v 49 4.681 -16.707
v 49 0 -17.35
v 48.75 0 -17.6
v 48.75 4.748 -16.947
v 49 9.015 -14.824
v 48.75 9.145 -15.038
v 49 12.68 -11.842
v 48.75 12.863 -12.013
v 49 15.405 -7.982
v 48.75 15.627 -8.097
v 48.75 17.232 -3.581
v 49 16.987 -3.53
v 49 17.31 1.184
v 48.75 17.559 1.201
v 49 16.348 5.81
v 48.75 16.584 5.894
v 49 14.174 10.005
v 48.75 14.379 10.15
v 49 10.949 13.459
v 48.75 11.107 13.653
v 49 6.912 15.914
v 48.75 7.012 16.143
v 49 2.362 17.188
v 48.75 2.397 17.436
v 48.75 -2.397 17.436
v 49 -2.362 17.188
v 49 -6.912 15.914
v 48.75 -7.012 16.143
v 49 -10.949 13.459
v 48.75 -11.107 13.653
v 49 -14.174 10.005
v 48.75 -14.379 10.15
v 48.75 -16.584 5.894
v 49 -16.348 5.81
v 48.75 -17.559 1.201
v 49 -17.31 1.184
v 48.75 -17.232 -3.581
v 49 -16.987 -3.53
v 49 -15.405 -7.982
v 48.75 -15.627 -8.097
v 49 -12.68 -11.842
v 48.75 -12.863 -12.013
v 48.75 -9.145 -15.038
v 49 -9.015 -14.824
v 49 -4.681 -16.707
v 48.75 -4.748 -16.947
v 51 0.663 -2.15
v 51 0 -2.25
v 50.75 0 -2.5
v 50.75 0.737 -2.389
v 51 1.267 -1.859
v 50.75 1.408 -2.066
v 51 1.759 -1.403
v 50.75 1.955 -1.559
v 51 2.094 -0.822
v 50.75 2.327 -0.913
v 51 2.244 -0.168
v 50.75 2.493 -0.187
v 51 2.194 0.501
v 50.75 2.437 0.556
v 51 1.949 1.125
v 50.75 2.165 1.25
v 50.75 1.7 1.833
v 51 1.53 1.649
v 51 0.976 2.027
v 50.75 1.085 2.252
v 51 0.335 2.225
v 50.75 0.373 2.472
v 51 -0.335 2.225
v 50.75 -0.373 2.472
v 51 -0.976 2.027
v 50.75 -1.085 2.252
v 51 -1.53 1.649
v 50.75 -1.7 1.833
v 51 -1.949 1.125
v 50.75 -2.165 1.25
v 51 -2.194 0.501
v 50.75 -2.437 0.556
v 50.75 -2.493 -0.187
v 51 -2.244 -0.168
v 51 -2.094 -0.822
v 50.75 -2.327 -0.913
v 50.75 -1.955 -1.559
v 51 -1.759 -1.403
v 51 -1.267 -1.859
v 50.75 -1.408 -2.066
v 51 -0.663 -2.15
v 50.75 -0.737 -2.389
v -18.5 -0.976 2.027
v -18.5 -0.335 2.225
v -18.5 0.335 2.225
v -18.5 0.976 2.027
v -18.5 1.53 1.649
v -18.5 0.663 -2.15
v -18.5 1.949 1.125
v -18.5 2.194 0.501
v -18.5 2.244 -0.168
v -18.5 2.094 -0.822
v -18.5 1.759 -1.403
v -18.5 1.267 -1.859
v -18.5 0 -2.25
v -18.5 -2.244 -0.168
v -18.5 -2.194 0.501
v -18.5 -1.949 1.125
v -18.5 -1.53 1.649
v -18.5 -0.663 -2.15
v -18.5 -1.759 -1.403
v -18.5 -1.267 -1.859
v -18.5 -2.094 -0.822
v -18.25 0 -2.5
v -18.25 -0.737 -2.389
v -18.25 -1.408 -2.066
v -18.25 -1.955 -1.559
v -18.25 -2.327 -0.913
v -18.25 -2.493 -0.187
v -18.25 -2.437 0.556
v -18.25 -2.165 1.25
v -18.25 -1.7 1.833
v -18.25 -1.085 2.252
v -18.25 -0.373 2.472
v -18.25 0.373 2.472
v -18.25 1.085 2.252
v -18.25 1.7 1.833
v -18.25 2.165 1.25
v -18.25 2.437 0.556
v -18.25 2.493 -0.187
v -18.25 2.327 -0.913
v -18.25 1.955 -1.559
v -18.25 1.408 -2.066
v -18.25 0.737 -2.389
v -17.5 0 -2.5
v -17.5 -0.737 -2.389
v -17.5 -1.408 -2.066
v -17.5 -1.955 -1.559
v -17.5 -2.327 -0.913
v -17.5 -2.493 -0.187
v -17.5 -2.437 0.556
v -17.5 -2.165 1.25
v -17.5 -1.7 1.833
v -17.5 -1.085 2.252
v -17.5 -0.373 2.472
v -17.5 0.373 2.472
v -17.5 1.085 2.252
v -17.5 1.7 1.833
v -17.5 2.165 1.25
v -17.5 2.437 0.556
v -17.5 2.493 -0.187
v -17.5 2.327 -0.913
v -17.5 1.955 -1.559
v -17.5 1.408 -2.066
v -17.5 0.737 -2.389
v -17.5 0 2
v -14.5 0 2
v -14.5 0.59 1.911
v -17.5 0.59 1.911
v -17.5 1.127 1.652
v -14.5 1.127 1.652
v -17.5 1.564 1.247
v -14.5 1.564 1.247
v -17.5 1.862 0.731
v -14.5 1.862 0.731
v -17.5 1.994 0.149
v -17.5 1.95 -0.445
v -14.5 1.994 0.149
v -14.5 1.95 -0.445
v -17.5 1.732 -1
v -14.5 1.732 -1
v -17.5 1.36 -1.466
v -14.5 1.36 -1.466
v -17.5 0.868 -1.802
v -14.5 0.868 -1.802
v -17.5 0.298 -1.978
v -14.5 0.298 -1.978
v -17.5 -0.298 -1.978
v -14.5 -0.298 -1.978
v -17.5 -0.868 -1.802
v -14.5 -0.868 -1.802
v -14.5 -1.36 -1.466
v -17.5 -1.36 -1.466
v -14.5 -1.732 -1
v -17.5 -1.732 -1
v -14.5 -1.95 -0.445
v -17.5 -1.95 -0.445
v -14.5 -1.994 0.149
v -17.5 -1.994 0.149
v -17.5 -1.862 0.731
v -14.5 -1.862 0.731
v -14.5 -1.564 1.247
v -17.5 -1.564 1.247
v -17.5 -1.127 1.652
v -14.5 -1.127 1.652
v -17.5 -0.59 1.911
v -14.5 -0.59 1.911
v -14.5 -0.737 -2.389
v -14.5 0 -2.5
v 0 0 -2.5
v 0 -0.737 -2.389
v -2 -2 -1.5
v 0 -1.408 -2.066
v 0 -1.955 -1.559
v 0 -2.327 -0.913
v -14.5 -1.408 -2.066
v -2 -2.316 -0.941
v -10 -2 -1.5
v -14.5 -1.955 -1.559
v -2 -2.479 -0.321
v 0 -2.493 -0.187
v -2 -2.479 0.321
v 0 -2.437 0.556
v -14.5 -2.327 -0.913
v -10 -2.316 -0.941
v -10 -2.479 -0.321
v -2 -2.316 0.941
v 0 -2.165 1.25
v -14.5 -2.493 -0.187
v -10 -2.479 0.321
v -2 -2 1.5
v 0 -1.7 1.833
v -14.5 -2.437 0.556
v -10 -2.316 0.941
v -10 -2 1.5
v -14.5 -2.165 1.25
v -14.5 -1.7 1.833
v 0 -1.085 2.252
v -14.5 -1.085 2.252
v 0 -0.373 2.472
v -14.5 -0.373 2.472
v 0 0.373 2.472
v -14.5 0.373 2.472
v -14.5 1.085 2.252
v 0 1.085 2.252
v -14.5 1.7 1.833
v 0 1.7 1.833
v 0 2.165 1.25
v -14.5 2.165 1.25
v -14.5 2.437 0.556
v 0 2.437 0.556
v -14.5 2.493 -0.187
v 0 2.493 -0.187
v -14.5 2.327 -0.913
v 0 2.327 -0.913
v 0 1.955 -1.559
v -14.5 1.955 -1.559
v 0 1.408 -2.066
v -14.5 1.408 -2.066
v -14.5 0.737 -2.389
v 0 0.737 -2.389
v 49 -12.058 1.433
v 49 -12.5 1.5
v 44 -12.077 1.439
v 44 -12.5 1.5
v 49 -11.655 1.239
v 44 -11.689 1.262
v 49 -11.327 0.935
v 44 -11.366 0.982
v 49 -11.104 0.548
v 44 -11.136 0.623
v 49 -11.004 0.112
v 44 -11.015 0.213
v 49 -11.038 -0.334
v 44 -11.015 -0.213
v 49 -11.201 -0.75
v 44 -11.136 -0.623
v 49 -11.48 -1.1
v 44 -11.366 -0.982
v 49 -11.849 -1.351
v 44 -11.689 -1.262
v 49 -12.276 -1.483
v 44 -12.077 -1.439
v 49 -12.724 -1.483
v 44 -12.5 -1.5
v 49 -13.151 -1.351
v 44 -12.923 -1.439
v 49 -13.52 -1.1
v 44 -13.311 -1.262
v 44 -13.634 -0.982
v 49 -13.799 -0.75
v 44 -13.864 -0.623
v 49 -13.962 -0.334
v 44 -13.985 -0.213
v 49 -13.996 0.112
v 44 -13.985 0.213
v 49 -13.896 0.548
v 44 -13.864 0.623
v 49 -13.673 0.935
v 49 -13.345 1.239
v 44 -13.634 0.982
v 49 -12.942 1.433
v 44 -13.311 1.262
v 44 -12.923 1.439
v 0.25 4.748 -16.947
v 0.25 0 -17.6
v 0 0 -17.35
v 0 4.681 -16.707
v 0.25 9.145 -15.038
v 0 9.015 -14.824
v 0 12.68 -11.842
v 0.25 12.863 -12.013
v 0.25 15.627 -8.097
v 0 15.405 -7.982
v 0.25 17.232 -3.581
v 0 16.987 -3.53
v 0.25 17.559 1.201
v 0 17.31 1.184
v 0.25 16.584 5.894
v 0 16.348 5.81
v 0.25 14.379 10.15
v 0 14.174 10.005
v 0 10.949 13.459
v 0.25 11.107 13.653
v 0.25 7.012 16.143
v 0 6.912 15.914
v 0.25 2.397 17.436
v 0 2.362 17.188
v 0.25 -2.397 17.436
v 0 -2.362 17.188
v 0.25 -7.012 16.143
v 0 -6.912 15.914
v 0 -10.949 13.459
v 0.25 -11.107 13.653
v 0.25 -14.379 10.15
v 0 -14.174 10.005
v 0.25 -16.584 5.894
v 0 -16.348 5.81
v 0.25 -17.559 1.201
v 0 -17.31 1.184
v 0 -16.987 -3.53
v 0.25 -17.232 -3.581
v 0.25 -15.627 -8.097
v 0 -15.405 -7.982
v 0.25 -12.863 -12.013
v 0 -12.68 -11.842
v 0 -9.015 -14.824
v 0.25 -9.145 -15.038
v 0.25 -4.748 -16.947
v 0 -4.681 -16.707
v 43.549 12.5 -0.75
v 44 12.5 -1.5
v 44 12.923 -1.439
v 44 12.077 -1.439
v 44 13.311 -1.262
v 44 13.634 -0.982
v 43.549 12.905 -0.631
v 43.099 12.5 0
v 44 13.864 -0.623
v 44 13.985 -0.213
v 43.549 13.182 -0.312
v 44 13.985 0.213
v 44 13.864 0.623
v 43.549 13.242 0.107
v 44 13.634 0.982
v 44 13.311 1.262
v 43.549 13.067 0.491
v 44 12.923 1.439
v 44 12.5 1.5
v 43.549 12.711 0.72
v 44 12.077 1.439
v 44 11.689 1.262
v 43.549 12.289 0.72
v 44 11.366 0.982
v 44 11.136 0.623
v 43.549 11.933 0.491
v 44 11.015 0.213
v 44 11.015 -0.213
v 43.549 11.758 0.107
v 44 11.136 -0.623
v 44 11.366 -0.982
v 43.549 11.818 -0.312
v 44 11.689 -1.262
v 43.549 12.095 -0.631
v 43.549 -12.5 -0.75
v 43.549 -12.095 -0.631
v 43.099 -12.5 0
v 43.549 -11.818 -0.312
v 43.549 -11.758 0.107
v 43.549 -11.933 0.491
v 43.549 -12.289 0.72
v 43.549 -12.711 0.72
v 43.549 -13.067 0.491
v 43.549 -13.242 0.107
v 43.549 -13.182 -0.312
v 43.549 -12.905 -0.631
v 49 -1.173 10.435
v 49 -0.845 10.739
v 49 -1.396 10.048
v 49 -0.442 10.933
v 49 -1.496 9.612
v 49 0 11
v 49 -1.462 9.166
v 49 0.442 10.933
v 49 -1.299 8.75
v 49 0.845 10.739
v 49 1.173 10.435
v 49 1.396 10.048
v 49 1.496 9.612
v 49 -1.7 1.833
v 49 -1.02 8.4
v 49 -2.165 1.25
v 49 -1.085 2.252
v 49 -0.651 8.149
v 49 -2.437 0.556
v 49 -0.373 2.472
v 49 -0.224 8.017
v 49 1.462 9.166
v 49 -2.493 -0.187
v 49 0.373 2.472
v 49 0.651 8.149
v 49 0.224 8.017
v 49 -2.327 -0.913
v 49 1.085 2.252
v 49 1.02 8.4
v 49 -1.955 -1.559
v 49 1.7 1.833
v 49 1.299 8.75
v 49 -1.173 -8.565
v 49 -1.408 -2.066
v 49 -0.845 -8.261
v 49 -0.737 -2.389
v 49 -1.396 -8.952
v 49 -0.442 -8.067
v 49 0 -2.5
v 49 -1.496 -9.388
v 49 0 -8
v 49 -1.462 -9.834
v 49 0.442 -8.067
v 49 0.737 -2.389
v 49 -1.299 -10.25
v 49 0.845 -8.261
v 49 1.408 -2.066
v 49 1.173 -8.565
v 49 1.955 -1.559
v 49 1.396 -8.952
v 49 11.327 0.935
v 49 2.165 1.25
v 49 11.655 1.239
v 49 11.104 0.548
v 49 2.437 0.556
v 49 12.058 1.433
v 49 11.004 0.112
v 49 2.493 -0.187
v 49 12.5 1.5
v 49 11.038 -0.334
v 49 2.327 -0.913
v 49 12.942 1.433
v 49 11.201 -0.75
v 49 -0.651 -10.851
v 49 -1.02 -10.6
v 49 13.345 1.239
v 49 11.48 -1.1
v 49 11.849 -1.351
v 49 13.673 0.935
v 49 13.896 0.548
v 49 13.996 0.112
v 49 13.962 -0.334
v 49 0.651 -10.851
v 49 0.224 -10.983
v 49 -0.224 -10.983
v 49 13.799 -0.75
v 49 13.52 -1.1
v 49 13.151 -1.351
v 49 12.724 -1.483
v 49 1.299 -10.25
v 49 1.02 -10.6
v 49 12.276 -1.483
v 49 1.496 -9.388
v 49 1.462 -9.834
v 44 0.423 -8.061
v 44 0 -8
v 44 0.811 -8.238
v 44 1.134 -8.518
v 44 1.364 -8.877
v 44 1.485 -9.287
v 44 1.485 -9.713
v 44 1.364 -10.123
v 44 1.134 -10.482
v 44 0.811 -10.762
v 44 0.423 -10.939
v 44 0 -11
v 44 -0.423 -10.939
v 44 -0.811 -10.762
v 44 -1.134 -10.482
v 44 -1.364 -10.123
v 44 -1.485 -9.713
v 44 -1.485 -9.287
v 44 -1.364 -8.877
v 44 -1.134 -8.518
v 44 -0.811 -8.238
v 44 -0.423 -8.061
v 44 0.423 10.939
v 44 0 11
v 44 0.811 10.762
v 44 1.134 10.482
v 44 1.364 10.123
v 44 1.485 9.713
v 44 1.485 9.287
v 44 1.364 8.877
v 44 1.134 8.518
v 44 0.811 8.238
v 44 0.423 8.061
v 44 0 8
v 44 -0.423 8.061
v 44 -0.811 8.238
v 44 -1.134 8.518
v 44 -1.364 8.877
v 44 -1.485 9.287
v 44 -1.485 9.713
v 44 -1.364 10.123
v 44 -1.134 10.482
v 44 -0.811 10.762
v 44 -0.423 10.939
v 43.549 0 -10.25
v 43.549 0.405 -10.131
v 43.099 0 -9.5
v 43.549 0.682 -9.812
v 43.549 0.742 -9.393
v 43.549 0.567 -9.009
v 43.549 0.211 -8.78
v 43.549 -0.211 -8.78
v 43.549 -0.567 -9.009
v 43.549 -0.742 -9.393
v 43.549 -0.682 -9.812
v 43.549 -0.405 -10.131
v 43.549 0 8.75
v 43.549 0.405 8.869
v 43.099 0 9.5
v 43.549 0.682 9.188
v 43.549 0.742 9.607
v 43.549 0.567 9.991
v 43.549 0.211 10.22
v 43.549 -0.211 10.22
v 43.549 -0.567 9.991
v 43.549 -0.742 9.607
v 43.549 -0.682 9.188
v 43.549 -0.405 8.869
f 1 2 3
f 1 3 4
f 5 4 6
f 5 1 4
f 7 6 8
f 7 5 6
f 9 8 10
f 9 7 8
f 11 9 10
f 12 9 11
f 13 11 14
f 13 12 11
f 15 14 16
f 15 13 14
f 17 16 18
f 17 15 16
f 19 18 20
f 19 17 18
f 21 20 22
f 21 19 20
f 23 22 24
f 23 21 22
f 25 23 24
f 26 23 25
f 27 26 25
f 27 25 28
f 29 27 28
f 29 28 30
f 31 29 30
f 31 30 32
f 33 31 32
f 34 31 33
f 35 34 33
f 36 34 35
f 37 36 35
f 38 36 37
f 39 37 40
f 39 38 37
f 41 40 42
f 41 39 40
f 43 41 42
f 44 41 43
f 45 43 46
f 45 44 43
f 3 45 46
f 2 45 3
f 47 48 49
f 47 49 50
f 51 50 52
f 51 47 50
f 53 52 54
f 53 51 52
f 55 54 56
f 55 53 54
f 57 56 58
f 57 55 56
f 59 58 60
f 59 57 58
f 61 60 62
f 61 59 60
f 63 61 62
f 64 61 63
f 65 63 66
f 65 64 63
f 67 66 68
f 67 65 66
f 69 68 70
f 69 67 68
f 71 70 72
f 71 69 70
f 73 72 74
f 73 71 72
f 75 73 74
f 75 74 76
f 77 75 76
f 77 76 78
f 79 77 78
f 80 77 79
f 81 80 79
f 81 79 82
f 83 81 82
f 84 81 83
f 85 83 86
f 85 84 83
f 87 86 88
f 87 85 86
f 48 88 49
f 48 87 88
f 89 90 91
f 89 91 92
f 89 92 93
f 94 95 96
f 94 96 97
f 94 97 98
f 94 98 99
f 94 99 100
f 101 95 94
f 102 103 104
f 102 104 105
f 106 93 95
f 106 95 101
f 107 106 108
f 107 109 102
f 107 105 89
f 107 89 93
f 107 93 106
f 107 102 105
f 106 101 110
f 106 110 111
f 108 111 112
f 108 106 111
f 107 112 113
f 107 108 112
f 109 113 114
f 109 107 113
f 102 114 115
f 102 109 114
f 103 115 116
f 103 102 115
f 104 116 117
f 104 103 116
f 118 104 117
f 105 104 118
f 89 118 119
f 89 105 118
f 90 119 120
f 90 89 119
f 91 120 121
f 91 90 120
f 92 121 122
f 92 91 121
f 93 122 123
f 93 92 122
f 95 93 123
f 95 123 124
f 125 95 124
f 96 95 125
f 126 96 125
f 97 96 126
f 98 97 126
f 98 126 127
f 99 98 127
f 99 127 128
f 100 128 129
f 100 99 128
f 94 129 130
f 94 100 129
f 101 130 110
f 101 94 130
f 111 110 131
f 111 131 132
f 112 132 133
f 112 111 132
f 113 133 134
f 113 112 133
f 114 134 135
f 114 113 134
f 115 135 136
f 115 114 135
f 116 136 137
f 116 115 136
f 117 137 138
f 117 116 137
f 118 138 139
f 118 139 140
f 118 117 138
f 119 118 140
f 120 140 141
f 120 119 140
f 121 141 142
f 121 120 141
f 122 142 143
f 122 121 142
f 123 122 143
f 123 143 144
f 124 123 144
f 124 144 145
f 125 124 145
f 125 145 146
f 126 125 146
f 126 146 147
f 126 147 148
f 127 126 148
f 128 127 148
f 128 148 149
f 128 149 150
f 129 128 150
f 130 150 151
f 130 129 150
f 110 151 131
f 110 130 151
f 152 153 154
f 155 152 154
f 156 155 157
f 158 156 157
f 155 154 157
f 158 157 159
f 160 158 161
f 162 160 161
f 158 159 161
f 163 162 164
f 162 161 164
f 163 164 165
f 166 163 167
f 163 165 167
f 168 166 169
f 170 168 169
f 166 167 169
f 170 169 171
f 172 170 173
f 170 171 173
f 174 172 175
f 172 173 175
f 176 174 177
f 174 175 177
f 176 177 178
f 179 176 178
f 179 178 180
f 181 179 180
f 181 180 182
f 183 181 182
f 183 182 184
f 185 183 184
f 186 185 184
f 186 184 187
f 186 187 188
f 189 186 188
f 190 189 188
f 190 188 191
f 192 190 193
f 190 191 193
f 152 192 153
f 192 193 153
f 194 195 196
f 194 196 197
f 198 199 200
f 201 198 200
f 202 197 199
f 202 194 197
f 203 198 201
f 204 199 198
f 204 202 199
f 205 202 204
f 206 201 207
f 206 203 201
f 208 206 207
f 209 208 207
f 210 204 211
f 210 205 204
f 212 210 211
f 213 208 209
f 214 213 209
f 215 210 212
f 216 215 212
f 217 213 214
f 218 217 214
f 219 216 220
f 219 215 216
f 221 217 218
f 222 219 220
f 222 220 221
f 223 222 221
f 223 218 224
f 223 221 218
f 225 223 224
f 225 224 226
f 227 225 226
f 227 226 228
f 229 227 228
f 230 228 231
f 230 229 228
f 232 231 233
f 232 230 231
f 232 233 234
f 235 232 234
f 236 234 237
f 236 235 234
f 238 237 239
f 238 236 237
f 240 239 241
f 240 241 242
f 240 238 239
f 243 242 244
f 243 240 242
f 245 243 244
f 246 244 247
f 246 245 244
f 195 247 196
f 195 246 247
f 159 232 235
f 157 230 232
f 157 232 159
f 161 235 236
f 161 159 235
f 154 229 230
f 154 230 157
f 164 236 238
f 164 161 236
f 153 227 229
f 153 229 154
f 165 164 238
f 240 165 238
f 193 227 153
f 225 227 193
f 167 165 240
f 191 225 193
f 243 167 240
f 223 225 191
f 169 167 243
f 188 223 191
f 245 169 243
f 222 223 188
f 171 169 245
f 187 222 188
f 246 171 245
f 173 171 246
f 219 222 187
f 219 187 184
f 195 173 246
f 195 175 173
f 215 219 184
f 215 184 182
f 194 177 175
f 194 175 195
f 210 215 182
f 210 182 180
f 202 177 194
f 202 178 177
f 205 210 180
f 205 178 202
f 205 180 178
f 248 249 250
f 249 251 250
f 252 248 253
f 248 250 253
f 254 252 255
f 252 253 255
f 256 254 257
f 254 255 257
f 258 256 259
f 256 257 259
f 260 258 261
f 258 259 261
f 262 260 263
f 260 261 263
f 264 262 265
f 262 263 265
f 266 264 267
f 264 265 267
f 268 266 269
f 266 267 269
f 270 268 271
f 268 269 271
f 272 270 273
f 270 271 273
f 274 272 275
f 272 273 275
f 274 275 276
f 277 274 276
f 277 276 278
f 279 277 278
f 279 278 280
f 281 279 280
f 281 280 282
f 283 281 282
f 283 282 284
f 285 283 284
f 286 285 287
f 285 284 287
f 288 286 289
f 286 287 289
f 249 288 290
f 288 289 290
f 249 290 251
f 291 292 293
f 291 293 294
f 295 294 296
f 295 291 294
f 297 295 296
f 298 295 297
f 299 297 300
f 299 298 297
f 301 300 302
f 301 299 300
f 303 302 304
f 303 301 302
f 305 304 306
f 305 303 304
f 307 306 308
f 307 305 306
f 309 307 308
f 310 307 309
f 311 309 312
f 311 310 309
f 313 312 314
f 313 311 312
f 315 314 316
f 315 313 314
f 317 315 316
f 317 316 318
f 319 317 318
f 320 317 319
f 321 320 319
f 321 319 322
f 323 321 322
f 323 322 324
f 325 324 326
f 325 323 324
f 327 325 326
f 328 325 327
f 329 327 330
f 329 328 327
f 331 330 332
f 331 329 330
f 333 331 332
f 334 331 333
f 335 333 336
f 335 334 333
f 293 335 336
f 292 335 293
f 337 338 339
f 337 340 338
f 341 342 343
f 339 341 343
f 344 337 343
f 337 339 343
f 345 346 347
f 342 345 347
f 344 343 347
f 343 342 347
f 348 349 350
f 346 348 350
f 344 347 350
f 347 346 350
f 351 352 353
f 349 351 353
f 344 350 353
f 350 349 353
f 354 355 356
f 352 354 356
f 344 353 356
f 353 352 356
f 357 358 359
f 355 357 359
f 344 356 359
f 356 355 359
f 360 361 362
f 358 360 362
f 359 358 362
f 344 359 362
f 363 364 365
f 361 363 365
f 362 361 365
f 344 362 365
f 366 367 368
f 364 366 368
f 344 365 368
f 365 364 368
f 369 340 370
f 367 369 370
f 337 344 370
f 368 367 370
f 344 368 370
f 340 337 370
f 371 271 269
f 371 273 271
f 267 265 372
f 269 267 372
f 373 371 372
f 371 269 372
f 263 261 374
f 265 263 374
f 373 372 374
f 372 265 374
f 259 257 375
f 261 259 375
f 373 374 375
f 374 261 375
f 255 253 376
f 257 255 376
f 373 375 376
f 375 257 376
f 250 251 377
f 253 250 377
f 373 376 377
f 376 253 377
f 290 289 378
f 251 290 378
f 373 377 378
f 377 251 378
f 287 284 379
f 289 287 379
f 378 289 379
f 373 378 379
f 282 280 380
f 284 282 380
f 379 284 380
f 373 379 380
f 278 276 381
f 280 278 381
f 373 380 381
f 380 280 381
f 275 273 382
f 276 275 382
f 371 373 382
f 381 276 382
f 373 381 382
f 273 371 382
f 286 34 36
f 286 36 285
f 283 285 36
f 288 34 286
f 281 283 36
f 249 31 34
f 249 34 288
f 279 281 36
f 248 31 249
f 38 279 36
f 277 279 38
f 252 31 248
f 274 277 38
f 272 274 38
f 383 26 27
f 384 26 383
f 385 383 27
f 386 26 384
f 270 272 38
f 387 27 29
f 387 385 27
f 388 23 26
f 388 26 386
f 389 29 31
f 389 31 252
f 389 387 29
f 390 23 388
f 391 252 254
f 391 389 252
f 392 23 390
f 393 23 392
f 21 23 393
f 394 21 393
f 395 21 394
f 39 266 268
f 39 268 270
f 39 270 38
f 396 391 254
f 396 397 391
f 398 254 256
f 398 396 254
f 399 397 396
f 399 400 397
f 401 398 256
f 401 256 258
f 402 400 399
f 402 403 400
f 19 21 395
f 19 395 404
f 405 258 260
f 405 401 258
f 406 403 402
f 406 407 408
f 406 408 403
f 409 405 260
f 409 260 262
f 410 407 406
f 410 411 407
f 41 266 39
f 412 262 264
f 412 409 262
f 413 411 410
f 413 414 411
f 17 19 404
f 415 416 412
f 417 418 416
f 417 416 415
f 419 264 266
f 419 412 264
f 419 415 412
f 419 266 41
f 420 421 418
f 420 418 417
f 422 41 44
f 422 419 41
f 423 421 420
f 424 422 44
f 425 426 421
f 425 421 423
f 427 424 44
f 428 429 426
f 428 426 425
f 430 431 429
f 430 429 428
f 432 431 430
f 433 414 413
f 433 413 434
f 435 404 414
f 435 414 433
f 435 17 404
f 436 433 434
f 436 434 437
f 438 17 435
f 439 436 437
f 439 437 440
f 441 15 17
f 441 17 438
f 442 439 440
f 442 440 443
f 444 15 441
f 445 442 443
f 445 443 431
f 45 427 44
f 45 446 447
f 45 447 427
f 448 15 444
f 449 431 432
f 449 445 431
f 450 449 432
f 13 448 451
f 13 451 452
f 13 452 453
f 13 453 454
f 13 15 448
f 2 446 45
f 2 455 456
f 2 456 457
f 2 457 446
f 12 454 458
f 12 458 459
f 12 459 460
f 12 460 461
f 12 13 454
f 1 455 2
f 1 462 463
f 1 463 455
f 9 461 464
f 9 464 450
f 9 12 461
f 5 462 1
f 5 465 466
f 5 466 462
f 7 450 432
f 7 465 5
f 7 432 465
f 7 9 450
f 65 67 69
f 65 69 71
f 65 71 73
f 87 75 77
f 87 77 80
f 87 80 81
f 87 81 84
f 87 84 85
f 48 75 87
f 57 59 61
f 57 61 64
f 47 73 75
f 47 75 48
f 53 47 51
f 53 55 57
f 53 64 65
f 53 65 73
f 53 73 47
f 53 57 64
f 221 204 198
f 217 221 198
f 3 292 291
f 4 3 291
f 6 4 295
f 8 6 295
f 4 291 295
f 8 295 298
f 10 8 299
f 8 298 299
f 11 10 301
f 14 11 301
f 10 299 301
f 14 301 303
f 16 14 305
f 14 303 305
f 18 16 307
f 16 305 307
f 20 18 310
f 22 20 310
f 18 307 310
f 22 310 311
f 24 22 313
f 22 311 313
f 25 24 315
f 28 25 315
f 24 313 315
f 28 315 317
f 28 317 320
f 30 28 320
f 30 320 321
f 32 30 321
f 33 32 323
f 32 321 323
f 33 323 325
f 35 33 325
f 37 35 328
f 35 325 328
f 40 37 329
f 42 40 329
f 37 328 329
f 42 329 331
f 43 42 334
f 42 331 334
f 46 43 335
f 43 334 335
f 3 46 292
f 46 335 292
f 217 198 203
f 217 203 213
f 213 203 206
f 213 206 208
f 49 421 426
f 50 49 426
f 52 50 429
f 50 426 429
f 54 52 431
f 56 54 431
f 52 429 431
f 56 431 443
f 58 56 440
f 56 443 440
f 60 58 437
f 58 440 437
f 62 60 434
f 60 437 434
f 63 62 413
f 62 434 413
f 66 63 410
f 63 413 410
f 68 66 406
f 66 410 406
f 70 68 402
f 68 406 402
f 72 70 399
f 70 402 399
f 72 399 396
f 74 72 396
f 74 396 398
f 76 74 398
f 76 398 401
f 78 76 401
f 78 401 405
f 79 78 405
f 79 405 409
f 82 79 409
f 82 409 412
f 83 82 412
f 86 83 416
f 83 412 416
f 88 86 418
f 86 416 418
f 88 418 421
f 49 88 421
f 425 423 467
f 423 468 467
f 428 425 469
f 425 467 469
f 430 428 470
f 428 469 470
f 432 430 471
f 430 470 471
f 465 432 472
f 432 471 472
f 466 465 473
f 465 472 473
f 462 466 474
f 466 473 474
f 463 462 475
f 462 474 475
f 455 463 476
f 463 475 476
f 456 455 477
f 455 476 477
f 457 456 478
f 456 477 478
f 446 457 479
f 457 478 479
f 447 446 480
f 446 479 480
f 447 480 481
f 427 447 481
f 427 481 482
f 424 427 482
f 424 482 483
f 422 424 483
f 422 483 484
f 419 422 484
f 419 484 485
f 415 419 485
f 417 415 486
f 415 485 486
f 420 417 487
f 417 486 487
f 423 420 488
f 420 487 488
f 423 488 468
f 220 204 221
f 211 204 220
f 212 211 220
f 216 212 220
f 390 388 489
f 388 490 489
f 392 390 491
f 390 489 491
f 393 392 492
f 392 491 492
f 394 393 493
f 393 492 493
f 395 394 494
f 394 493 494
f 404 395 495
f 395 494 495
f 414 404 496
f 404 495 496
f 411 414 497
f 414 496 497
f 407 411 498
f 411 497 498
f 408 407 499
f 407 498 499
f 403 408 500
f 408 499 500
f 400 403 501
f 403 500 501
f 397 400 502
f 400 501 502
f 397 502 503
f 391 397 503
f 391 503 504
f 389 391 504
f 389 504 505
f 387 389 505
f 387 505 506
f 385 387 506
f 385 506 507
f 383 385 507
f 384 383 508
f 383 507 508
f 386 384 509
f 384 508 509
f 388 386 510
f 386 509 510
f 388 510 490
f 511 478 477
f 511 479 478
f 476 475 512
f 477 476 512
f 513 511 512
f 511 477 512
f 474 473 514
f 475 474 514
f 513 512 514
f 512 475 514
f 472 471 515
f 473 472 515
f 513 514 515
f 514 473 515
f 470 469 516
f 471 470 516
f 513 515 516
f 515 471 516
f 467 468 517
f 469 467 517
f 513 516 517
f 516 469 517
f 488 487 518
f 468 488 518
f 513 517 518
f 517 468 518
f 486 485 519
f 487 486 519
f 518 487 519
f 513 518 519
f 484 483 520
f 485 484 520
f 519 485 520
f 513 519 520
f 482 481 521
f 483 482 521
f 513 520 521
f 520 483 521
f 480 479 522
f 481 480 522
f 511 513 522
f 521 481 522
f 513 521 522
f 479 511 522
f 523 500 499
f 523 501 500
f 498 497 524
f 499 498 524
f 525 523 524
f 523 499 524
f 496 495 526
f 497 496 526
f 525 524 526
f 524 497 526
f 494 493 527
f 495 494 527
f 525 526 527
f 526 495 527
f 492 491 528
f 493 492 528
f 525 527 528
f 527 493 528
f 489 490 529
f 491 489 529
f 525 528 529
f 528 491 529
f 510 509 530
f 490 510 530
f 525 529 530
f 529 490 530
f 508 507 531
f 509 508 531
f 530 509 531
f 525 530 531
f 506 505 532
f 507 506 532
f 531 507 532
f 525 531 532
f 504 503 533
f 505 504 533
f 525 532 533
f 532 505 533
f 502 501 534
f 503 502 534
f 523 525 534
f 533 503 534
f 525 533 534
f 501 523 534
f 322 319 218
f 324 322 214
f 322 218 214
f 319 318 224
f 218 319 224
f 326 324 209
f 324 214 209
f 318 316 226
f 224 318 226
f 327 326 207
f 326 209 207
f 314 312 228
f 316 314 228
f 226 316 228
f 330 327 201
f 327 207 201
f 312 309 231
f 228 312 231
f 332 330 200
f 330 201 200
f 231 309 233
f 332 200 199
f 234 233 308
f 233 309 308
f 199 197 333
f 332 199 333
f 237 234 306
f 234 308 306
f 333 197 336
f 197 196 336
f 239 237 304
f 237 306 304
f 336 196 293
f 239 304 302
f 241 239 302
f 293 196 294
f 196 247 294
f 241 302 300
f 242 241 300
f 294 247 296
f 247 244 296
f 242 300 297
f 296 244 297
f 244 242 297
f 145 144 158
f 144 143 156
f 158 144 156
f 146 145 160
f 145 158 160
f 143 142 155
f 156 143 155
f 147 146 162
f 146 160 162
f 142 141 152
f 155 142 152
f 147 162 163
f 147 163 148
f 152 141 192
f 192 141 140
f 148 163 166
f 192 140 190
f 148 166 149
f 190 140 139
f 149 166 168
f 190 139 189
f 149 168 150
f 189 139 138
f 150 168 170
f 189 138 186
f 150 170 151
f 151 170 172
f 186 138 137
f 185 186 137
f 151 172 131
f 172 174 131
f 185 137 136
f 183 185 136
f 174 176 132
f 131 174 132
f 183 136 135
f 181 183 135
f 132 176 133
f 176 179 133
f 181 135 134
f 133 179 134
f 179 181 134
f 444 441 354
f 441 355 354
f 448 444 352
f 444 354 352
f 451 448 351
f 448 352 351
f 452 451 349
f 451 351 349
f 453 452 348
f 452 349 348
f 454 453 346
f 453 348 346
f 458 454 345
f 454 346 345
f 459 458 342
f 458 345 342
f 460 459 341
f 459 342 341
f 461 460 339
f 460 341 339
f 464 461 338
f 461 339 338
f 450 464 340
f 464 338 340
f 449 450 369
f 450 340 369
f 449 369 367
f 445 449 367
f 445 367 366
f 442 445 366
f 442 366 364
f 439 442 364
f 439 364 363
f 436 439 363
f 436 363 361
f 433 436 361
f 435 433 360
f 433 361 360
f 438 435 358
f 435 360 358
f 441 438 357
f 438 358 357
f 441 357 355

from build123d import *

# Parameters (mm, degrees)
SKETCH1_R                    = 17.6
BOSS_EXTRUDE1_DEPTH          = 49
F_3_0_3_DIAMETER_HOLE1_D     = 3
F_3_0_3_DIAMETER_HOLE1_DEPTH = 5
F_3_0_3_DIAMETER_HOLE1_TIP   = 0.901290929
SKETCH6_R                    = 2.5
BOSS_EXTRUDE2_DEPTH          = 2
BOSS_EXTRUDE3_START          = 14.5
SKETCH7_R                    = 2.5
BOSS_EXTRUDE3_DEPTH          = 14.5
SKETCH8_R                    = 2
BOSS_EXTRUDE4_DEPTH          = 3
BOSS_EXTRUDE5_START          = 18.5
SKETCH7_2_R                  = 2.5
BOSS_EXTRUDE5_DEPTH          = 1
CHAMFER1_SIZE                = 0.25
CUT_EXTRUDE1_DEPTH           = 57.749625549
CUT_EXTRUDE1_DEPTH_BACK      = 57.749625549
SKETCH9_W                    = 8
SKETCH9_H                    = 0.5


with BuildPart() as part:
    # Sketch1 → Boss-Extrude1 (new body)
    with BuildSketch(Plane(origin=(0, 0, 0), x_dir=(0, 0, -1), z_dir=(1, 0, 0))):
        Circle(SKETCH1_R)
    extrude(amount=BOSS_EXTRUDE1_DEPTH)

    # Ø3.0 (3) Diameter Hole1
    with Locations(Plane(origin=(49, 0, 0), x_dir=(0, 0, -1), z_dir=(1, 0, 0))):
        with Locations((0, 12.5), (9.5, 0), (0, -12.5), (-9.5, 0)):
            Hole(F_3_0_3_DIAMETER_HOLE1_D / 2, depth=F_3_0_3_DIAMETER_HOLE1_DEPTH)
            with Locations((0, 0, -(F_3_0_3_DIAMETER_HOLE1_DEPTH + F_3_0_3_DIAMETER_HOLE1_TIP / 2))):  # 118° drill point
                Cone(0, F_3_0_3_DIAMETER_HOLE1_D / 2, F_3_0_3_DIAMETER_HOLE1_TIP, mode=Mode.SUBTRACT)

    # Sketch6 → Boss-Extrude2 (add)
    with BuildSketch(Plane(origin=(49, 0, 0), x_dir=(0, 0, -1), z_dir=(1, 0, 0))):
        Circle(SKETCH6_R)
    extrude(amount=BOSS_EXTRUDE2_DEPTH)

    # Sketch7 → Boss-Extrude3 (add)
    with BuildSketch(Plane.ZY.offset(BOSS_EXTRUDE3_START)):
        Circle(SKETCH7_R)
    extrude(amount=-BOSS_EXTRUDE3_DEPTH)

    # Sketch8 → Boss-Extrude4 (add)
    with BuildSketch(Plane.ZY.offset(14.5)):
        Circle(SKETCH8_R)
    extrude(amount=BOSS_EXTRUDE4_DEPTH)

    # Sketch7<2> → Boss-Extrude5 (add)
    with BuildSketch(Plane.ZY.offset(BOSS_EXTRUDE5_START)):
        Circle(SKETCH7_2_R)
    extrude(amount=-BOSS_EXTRUDE5_DEPTH)

    # Chamfer1
    chamfer1_edges = [part.edges().sort_by_distance(p)[0] for p in [
        (51, 0, 2.5),
        (-18.5, 0, -2.5),
        (0, 0, 17.6),
        (49, 0, 17.6),
    ]]
    chamfer(chamfer1_edges, length=CHAMFER1_SIZE)

    # Sketch9 → Cut-Extrude1 (cut, two sides: drawn at the far end of the back side and taken through both)
    with BuildSketch(Plane.XY.offset(-CUT_EXTRUDE1_DEPTH_BACK)):
        with Locations((-6, -2.25)):
            Rectangle(SKETCH9_W, SKETCH9_H)
    extrude(amount=CUT_EXTRUDE1_DEPTH + CUT_EXTRUDE1_DEPTH_BACK, mode=Mode.SUBTRACT)


solid = part.part
